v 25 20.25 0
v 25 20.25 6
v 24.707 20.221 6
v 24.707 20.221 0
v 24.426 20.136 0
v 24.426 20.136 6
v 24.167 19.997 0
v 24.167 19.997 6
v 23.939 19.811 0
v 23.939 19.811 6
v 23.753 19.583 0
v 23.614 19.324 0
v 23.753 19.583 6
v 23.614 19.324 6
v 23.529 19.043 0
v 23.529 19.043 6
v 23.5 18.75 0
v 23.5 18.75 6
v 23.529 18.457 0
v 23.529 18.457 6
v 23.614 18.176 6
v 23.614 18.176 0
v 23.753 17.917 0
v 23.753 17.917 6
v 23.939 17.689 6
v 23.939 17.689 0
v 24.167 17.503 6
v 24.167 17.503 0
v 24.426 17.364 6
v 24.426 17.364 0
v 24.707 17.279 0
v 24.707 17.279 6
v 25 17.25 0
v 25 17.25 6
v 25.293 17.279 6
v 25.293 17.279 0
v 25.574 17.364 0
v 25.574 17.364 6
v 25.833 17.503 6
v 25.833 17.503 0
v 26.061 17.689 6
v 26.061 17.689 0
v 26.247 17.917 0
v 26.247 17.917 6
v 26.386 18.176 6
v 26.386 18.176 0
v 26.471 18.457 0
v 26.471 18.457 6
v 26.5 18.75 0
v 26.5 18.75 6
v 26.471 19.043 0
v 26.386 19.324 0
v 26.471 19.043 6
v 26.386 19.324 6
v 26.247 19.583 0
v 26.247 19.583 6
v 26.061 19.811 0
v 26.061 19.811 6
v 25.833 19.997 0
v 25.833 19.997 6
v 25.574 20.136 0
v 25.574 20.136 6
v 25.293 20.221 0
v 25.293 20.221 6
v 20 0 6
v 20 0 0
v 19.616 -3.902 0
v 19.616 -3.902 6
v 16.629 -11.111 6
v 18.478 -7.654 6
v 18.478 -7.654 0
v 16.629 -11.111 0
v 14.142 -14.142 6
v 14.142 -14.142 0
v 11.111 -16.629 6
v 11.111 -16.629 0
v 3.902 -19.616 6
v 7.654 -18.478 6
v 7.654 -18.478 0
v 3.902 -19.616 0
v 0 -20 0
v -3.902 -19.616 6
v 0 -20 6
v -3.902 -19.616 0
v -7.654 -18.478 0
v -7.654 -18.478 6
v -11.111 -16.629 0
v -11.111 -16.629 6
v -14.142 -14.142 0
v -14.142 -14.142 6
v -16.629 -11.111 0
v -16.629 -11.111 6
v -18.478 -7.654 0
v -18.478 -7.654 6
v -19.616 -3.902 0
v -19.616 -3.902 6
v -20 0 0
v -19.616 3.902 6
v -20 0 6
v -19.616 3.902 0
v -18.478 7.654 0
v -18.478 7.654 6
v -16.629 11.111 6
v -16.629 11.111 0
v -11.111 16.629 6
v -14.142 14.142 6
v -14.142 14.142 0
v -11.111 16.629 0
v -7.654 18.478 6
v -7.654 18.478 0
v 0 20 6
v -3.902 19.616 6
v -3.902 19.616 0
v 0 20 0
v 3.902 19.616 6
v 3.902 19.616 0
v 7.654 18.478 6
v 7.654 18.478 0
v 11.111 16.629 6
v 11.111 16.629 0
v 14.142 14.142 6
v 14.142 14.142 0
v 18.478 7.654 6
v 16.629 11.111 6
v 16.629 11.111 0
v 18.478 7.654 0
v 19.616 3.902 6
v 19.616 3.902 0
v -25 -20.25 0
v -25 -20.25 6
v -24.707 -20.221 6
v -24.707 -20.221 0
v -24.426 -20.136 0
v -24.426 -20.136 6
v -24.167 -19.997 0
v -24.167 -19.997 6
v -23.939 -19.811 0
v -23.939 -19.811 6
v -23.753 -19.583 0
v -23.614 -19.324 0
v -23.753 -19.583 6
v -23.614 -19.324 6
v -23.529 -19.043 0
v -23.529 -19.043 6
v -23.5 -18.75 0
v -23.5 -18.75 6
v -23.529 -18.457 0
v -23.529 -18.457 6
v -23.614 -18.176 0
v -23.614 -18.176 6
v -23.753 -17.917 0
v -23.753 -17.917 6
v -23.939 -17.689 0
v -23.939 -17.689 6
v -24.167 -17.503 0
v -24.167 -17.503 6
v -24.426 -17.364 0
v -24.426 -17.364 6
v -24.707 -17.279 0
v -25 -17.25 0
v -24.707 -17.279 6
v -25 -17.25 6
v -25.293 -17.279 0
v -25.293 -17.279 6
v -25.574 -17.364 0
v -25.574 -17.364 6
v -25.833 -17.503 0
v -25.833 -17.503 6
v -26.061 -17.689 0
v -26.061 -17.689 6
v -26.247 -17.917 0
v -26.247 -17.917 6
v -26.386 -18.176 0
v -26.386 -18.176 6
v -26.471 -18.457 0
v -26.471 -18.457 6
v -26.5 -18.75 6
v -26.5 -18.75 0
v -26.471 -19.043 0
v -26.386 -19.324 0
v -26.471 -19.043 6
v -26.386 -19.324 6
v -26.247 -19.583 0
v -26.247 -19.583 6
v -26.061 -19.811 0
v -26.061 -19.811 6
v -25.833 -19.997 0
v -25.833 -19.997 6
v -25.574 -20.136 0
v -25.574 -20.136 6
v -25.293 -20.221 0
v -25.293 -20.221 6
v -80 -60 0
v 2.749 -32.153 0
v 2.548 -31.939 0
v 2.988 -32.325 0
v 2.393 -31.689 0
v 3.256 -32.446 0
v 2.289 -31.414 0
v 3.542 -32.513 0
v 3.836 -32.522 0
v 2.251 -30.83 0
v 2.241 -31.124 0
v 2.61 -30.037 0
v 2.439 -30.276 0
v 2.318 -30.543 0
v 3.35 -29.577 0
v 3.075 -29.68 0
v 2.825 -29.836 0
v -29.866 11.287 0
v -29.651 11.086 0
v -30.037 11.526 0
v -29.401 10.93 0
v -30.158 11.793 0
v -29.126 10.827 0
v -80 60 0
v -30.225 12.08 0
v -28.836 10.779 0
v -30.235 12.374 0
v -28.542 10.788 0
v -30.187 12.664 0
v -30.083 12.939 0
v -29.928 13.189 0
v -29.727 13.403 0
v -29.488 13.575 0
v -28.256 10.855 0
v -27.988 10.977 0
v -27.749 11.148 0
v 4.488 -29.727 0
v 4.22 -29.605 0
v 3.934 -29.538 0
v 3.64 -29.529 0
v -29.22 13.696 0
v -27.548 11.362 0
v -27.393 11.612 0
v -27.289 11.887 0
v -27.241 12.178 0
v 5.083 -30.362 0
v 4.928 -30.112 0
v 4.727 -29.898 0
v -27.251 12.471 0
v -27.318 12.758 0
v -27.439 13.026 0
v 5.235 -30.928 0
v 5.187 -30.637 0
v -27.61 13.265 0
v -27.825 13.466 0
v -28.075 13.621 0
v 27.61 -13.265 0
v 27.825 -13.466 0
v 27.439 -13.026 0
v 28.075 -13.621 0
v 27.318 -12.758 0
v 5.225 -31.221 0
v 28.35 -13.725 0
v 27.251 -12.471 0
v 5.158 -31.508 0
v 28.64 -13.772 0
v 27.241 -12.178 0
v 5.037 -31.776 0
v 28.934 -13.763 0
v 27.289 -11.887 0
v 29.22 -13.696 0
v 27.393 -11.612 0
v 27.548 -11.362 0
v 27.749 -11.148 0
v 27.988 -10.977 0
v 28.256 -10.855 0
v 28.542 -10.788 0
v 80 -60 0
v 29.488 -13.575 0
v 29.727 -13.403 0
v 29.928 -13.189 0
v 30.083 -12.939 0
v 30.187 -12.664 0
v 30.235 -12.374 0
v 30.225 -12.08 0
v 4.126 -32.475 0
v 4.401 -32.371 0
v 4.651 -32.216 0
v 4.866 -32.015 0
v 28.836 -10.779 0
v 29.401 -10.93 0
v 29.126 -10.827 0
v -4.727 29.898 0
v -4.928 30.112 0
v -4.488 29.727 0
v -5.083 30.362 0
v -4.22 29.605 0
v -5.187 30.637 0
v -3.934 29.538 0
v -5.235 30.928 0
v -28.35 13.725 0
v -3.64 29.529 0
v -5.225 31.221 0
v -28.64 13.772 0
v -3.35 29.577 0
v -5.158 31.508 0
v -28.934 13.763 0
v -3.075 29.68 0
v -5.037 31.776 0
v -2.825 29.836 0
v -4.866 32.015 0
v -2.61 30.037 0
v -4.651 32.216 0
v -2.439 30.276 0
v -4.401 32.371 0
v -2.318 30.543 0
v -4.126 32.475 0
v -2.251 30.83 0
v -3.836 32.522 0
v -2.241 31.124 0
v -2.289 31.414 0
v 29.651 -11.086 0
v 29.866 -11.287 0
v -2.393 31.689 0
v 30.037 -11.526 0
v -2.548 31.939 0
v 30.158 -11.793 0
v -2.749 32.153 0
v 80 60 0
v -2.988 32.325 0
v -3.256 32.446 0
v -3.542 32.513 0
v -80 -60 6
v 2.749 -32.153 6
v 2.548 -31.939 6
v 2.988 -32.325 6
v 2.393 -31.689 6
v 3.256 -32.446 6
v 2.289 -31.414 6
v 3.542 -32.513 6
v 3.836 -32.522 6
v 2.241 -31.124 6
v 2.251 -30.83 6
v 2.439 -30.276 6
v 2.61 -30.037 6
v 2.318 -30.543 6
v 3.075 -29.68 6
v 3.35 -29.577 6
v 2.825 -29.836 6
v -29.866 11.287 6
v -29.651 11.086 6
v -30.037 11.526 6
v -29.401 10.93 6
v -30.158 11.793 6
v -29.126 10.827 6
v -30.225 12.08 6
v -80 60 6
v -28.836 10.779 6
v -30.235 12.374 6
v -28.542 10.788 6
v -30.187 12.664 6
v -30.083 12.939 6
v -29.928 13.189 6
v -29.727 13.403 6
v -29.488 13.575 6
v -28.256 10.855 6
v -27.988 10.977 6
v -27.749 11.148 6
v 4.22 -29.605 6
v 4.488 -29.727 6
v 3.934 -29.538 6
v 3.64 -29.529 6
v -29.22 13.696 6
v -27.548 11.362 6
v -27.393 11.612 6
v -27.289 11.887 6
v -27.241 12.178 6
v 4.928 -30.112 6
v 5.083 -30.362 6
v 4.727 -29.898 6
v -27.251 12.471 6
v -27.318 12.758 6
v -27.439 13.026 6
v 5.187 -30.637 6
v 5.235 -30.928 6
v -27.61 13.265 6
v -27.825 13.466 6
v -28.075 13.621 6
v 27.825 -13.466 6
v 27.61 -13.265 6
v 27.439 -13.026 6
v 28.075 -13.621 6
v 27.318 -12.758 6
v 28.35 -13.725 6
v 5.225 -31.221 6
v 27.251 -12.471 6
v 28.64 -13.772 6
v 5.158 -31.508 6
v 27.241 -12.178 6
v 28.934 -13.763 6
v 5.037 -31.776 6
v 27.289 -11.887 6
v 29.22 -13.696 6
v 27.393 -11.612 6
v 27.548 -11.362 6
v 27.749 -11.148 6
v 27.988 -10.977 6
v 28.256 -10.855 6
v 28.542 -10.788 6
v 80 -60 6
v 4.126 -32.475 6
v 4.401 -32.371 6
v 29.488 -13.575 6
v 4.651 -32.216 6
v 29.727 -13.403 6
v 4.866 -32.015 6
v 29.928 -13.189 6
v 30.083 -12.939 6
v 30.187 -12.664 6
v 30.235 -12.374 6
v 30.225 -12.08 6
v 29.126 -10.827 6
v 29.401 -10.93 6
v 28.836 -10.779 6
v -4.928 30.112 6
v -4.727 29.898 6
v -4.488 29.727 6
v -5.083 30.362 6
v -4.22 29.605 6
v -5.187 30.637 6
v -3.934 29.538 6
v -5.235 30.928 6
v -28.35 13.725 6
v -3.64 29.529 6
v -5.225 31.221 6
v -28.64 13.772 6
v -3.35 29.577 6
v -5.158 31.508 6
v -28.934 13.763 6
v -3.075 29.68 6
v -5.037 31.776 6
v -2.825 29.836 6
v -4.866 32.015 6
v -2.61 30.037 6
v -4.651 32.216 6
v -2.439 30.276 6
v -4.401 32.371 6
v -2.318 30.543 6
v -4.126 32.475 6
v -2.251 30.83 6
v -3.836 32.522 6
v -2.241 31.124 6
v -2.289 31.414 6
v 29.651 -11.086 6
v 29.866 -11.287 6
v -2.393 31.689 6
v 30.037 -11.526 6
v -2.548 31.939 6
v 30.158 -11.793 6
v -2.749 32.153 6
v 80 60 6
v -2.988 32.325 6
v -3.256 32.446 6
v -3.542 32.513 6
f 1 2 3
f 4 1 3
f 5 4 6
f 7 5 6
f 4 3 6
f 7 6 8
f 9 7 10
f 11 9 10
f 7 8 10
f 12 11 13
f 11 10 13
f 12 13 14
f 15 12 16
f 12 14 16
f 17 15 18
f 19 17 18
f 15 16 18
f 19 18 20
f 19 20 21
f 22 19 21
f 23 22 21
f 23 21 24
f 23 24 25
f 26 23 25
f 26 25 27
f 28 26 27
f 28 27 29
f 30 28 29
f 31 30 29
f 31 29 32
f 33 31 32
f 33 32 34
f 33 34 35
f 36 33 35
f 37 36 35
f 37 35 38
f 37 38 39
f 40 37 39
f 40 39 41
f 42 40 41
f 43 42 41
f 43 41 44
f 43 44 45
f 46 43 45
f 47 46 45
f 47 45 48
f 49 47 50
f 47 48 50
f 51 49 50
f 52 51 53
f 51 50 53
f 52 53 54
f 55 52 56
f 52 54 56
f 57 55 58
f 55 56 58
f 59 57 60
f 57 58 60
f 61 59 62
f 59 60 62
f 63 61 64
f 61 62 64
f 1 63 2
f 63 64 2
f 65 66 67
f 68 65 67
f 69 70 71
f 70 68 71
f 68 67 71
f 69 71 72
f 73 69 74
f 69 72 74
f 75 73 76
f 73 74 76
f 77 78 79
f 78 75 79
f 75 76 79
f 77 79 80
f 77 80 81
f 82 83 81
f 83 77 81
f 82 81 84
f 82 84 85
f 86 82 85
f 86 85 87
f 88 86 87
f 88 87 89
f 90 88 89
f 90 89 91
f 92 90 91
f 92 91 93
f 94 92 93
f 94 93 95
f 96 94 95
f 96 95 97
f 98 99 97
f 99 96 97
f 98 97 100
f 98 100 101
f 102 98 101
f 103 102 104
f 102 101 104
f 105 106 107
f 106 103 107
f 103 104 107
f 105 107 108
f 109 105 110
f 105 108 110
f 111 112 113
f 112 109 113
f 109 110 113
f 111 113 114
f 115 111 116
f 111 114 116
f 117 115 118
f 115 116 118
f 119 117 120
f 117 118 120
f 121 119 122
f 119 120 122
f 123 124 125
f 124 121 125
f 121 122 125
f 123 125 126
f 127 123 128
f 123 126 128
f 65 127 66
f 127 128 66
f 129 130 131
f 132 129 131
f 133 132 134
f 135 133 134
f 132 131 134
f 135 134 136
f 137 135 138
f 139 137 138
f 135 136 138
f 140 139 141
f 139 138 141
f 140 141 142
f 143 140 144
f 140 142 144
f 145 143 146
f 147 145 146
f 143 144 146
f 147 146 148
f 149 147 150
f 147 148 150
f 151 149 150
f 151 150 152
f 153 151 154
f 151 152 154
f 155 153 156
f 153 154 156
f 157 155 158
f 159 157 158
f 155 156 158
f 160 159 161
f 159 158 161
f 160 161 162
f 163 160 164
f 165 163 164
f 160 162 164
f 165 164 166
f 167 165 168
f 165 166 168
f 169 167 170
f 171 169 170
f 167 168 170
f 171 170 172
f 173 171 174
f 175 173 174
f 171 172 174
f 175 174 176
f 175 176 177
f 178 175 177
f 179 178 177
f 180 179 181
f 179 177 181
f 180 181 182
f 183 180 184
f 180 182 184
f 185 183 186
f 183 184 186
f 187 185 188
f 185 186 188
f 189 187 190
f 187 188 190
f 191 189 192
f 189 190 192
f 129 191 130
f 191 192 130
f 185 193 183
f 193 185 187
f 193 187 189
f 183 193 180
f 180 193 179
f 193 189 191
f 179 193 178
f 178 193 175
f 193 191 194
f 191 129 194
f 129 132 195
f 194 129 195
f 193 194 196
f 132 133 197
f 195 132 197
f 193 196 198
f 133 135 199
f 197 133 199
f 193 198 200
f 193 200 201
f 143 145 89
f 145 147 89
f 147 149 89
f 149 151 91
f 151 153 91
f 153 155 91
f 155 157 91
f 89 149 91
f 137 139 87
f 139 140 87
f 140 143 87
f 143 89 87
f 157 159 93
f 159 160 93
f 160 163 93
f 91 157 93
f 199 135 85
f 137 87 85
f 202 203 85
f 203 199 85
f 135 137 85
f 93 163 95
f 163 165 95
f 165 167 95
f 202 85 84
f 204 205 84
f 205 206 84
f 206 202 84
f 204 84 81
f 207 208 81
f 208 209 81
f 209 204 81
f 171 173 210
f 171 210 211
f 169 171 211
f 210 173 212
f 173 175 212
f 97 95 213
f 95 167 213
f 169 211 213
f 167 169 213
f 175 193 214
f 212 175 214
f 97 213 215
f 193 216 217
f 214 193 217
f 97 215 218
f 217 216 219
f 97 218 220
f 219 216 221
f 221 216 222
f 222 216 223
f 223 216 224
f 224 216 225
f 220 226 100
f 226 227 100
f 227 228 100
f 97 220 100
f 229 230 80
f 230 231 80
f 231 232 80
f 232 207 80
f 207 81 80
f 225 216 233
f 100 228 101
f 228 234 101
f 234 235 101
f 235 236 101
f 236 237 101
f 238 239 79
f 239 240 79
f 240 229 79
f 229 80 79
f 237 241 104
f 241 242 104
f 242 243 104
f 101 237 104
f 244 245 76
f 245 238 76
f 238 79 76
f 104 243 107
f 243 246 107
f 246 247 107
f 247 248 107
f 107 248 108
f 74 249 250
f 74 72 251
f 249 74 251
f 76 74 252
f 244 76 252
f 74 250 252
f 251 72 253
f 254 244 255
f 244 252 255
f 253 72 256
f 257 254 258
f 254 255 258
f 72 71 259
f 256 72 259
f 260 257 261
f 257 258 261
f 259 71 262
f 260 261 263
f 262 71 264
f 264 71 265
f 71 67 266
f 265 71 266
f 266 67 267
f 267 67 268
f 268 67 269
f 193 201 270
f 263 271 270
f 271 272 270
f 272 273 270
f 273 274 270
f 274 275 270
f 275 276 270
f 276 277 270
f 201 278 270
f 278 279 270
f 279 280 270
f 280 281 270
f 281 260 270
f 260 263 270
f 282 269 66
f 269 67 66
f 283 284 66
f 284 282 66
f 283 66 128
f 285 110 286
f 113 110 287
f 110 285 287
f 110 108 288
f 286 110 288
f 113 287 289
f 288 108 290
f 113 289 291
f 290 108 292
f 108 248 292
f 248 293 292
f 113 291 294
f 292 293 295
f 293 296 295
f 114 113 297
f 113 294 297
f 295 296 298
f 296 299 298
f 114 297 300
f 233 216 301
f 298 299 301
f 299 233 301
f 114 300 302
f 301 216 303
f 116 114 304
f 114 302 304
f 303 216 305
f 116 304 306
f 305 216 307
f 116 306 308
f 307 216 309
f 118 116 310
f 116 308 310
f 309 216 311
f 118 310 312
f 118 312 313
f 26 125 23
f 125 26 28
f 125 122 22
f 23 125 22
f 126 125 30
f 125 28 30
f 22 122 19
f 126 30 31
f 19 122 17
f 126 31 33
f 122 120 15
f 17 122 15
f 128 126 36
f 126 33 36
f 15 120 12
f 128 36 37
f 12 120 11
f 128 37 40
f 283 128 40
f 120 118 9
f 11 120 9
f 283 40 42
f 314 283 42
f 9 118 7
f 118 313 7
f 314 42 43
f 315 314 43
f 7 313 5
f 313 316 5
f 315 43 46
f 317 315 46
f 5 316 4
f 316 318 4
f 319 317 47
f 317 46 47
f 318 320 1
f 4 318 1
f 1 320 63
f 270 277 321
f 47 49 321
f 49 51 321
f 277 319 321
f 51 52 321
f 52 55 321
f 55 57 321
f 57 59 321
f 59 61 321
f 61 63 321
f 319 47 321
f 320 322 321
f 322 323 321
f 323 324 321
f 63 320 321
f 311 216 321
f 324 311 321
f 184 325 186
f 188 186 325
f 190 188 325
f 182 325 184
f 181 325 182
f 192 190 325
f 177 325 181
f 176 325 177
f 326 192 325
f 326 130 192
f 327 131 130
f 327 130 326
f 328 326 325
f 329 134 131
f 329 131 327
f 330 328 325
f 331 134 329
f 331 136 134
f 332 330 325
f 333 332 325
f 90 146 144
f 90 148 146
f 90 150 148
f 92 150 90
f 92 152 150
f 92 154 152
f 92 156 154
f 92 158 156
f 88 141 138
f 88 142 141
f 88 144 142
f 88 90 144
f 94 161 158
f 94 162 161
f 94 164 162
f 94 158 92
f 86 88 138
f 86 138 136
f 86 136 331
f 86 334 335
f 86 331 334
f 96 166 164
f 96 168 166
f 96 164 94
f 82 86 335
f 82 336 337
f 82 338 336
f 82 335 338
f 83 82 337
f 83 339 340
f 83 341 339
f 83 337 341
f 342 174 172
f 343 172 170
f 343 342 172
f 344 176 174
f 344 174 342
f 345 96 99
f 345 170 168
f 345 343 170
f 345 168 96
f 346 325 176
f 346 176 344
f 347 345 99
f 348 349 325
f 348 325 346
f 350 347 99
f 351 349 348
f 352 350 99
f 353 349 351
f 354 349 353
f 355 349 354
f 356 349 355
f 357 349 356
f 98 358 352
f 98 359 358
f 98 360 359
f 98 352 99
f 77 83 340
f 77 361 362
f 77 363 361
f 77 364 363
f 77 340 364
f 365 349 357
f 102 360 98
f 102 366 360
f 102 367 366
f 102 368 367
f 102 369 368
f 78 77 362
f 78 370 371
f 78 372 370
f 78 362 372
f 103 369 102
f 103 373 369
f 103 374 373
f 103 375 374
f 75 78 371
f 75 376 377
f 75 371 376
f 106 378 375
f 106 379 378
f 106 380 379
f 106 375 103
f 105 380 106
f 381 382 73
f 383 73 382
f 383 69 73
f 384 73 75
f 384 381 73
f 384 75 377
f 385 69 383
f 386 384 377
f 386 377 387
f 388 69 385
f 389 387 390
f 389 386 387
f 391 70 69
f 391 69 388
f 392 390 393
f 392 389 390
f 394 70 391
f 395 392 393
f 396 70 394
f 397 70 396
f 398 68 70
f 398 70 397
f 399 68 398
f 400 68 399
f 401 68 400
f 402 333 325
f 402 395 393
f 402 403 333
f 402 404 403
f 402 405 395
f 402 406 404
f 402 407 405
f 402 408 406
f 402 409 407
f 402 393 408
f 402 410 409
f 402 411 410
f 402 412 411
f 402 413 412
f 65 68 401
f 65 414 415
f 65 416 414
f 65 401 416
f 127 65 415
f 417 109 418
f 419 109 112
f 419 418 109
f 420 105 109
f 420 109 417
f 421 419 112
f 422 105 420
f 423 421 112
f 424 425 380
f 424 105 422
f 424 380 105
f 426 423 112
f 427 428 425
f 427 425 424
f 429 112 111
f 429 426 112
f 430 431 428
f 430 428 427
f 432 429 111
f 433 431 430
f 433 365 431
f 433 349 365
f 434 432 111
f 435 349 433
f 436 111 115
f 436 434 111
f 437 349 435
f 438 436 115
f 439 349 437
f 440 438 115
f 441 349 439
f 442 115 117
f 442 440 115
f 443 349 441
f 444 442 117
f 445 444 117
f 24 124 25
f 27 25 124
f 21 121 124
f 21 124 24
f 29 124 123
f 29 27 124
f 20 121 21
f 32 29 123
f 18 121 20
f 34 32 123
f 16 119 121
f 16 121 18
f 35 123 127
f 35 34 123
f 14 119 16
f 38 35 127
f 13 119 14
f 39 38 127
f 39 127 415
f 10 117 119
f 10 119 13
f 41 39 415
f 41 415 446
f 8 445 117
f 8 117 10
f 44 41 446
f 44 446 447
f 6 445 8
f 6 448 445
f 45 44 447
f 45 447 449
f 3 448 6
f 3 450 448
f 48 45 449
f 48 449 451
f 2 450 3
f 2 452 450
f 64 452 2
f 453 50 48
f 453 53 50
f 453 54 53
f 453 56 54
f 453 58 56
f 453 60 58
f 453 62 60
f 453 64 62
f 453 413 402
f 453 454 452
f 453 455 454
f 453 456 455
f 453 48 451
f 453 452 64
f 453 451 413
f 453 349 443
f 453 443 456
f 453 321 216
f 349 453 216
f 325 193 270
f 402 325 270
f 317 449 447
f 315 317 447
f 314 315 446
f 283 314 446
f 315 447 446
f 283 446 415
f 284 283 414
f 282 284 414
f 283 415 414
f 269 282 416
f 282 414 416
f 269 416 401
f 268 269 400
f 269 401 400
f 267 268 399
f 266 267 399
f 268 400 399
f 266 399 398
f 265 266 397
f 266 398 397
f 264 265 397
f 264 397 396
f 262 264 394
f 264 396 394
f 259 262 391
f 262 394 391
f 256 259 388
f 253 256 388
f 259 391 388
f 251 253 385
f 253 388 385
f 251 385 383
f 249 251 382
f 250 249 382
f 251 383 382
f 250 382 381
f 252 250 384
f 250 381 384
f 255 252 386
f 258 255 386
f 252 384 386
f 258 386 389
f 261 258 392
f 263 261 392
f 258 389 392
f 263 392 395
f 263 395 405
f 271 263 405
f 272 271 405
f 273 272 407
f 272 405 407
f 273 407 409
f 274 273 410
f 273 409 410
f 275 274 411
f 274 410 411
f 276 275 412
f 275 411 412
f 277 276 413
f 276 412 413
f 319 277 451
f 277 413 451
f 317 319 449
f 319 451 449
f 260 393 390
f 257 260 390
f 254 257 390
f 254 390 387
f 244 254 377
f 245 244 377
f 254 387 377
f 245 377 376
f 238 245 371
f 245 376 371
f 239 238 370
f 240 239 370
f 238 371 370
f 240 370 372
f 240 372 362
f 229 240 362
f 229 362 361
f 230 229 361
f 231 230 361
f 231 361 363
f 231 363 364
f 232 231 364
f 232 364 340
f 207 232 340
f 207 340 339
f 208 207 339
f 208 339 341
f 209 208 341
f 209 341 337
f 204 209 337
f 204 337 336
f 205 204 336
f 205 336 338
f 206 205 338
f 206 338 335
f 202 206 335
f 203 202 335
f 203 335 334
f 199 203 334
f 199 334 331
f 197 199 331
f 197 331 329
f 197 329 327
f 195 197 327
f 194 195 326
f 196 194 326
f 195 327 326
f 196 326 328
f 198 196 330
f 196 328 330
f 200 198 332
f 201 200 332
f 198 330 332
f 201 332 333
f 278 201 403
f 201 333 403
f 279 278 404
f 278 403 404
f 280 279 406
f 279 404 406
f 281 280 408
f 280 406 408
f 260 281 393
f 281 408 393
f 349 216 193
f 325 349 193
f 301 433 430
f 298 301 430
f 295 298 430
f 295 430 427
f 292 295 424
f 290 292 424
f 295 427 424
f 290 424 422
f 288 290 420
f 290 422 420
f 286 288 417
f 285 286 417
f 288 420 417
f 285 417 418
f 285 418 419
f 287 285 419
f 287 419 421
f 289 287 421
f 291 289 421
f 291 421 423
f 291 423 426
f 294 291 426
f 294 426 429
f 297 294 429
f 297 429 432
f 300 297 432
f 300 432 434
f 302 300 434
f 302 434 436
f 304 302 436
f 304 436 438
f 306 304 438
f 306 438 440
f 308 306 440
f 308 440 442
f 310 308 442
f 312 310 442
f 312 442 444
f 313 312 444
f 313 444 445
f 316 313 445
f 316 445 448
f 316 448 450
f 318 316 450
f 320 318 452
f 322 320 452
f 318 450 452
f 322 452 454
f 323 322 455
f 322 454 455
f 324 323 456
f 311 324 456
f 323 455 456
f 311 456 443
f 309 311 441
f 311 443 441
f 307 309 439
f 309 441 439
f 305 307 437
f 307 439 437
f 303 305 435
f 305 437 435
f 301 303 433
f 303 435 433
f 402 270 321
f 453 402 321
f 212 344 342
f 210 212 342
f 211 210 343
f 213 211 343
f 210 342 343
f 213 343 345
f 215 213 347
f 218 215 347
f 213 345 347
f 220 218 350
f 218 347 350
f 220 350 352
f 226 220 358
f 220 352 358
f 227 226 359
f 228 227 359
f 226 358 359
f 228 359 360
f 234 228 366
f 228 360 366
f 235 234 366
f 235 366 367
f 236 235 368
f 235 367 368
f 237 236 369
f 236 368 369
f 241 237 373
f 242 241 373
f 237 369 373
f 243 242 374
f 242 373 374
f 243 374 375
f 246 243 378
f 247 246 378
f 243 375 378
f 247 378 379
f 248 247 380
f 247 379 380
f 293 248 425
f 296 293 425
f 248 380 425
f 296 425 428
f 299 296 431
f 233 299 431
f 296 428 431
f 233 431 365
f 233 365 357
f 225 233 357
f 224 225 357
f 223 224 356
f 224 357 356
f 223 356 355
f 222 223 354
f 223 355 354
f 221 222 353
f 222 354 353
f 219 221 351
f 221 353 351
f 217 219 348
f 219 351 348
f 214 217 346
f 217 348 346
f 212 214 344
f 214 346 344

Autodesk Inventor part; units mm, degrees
ref_plane "YZ Plane" through (0, 0, 0) normal (1, 0, 0) x (0, 1, 0)
ref_plane "XZ Plane" through (0, 0, 0) normal (0, 1, 0) x (-1, 0, 0)
ref_plane "XY Plane" through (0, 0, 0) normal (0, 0, 1) x (1, 0, 0)
sketch "Sketch1" plane through (0, 0, 0) normal (0, 0, 1) x (1, 0, 0)
  line L0 (-80, -60) -> (80, -60)
  line L1 (80, -60) -> (80, 60)
  line L2 (80, 60) -> (-80, 60)
  line L3 (-80, 60) -> (-80, -60)
  line L4 (-80, -60) -> (80, 60) construction
  line L5 (80, -60) -> (-80, 60) construction
  circle A0 centre (0, 0) radius 20
  point P0 (25, 18.75)
  dimension "d0" = 160
  dimension "d1" = 120
  dimension "d2" = 40
  dimension "d5" = 25
extrude "Extrusion1" add sketch "Sketch1" along normal blind 6
hole "Hole1" at (25, 18.75, 0) direction (0, 0, 1) diameter 3 end through all
pattern_circular "Circular Pattern1" count 6 over 360 about axis through (0, 0, 0) along (0, 0, 1) of "Hole1"
properties part number "base_plate" material "Plywood, Finish"
